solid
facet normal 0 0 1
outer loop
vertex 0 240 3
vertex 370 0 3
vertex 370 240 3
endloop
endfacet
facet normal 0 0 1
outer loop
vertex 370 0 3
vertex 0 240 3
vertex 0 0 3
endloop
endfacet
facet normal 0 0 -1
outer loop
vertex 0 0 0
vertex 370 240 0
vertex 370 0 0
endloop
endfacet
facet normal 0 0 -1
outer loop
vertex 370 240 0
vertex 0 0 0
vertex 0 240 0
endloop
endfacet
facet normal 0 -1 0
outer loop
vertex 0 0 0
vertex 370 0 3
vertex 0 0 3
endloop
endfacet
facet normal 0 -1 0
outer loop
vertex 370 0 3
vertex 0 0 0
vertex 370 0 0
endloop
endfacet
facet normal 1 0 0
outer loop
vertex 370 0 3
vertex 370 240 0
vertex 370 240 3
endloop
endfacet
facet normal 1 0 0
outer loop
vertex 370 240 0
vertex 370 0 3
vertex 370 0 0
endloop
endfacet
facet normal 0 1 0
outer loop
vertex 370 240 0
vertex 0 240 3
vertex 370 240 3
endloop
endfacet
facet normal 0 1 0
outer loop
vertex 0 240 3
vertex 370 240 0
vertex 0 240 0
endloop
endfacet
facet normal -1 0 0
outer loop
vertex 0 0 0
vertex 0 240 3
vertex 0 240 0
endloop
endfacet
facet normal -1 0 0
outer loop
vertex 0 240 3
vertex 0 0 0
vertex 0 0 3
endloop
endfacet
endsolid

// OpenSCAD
// ModuDeck donor chassis study: NOT a verified ThinkPad fit.
// Millimetres. 370x240 is an unconfirmed owner measurement.
$fn=32; W=370; D=240; t=3;
module plate(w,d,h){cube([w,d,h]);}
module shell(w,d,h){difference(){cube([w,d,h]);translate([t,t,t])cube([w-2*t,d-2*t,h]);}}
module hole(x,y,h){translate([x,y,-1])cylinder(d=3.4,h=h+2);}
module rail(n){difference(){cube([n,12,6]);for(x=[10:20:n-10])hole(x,6,6);}}
module rear(){difference(){cube([W-6,3,25]);translate([W/2-23,-1,6])cube([40,5,14]);for(x=[10,W-16])translate([x,-1,12])rotate([-90,0,0])cylinder(d=3.4,h=5);}}
module tray(){difference(){shell(W,D,30);translate([3,D-4,3])cube([W-6,6,27]);for(x=[15,W-15],y=[15,D-15])hole(x,y,30);}}
plate(W,D,3);
